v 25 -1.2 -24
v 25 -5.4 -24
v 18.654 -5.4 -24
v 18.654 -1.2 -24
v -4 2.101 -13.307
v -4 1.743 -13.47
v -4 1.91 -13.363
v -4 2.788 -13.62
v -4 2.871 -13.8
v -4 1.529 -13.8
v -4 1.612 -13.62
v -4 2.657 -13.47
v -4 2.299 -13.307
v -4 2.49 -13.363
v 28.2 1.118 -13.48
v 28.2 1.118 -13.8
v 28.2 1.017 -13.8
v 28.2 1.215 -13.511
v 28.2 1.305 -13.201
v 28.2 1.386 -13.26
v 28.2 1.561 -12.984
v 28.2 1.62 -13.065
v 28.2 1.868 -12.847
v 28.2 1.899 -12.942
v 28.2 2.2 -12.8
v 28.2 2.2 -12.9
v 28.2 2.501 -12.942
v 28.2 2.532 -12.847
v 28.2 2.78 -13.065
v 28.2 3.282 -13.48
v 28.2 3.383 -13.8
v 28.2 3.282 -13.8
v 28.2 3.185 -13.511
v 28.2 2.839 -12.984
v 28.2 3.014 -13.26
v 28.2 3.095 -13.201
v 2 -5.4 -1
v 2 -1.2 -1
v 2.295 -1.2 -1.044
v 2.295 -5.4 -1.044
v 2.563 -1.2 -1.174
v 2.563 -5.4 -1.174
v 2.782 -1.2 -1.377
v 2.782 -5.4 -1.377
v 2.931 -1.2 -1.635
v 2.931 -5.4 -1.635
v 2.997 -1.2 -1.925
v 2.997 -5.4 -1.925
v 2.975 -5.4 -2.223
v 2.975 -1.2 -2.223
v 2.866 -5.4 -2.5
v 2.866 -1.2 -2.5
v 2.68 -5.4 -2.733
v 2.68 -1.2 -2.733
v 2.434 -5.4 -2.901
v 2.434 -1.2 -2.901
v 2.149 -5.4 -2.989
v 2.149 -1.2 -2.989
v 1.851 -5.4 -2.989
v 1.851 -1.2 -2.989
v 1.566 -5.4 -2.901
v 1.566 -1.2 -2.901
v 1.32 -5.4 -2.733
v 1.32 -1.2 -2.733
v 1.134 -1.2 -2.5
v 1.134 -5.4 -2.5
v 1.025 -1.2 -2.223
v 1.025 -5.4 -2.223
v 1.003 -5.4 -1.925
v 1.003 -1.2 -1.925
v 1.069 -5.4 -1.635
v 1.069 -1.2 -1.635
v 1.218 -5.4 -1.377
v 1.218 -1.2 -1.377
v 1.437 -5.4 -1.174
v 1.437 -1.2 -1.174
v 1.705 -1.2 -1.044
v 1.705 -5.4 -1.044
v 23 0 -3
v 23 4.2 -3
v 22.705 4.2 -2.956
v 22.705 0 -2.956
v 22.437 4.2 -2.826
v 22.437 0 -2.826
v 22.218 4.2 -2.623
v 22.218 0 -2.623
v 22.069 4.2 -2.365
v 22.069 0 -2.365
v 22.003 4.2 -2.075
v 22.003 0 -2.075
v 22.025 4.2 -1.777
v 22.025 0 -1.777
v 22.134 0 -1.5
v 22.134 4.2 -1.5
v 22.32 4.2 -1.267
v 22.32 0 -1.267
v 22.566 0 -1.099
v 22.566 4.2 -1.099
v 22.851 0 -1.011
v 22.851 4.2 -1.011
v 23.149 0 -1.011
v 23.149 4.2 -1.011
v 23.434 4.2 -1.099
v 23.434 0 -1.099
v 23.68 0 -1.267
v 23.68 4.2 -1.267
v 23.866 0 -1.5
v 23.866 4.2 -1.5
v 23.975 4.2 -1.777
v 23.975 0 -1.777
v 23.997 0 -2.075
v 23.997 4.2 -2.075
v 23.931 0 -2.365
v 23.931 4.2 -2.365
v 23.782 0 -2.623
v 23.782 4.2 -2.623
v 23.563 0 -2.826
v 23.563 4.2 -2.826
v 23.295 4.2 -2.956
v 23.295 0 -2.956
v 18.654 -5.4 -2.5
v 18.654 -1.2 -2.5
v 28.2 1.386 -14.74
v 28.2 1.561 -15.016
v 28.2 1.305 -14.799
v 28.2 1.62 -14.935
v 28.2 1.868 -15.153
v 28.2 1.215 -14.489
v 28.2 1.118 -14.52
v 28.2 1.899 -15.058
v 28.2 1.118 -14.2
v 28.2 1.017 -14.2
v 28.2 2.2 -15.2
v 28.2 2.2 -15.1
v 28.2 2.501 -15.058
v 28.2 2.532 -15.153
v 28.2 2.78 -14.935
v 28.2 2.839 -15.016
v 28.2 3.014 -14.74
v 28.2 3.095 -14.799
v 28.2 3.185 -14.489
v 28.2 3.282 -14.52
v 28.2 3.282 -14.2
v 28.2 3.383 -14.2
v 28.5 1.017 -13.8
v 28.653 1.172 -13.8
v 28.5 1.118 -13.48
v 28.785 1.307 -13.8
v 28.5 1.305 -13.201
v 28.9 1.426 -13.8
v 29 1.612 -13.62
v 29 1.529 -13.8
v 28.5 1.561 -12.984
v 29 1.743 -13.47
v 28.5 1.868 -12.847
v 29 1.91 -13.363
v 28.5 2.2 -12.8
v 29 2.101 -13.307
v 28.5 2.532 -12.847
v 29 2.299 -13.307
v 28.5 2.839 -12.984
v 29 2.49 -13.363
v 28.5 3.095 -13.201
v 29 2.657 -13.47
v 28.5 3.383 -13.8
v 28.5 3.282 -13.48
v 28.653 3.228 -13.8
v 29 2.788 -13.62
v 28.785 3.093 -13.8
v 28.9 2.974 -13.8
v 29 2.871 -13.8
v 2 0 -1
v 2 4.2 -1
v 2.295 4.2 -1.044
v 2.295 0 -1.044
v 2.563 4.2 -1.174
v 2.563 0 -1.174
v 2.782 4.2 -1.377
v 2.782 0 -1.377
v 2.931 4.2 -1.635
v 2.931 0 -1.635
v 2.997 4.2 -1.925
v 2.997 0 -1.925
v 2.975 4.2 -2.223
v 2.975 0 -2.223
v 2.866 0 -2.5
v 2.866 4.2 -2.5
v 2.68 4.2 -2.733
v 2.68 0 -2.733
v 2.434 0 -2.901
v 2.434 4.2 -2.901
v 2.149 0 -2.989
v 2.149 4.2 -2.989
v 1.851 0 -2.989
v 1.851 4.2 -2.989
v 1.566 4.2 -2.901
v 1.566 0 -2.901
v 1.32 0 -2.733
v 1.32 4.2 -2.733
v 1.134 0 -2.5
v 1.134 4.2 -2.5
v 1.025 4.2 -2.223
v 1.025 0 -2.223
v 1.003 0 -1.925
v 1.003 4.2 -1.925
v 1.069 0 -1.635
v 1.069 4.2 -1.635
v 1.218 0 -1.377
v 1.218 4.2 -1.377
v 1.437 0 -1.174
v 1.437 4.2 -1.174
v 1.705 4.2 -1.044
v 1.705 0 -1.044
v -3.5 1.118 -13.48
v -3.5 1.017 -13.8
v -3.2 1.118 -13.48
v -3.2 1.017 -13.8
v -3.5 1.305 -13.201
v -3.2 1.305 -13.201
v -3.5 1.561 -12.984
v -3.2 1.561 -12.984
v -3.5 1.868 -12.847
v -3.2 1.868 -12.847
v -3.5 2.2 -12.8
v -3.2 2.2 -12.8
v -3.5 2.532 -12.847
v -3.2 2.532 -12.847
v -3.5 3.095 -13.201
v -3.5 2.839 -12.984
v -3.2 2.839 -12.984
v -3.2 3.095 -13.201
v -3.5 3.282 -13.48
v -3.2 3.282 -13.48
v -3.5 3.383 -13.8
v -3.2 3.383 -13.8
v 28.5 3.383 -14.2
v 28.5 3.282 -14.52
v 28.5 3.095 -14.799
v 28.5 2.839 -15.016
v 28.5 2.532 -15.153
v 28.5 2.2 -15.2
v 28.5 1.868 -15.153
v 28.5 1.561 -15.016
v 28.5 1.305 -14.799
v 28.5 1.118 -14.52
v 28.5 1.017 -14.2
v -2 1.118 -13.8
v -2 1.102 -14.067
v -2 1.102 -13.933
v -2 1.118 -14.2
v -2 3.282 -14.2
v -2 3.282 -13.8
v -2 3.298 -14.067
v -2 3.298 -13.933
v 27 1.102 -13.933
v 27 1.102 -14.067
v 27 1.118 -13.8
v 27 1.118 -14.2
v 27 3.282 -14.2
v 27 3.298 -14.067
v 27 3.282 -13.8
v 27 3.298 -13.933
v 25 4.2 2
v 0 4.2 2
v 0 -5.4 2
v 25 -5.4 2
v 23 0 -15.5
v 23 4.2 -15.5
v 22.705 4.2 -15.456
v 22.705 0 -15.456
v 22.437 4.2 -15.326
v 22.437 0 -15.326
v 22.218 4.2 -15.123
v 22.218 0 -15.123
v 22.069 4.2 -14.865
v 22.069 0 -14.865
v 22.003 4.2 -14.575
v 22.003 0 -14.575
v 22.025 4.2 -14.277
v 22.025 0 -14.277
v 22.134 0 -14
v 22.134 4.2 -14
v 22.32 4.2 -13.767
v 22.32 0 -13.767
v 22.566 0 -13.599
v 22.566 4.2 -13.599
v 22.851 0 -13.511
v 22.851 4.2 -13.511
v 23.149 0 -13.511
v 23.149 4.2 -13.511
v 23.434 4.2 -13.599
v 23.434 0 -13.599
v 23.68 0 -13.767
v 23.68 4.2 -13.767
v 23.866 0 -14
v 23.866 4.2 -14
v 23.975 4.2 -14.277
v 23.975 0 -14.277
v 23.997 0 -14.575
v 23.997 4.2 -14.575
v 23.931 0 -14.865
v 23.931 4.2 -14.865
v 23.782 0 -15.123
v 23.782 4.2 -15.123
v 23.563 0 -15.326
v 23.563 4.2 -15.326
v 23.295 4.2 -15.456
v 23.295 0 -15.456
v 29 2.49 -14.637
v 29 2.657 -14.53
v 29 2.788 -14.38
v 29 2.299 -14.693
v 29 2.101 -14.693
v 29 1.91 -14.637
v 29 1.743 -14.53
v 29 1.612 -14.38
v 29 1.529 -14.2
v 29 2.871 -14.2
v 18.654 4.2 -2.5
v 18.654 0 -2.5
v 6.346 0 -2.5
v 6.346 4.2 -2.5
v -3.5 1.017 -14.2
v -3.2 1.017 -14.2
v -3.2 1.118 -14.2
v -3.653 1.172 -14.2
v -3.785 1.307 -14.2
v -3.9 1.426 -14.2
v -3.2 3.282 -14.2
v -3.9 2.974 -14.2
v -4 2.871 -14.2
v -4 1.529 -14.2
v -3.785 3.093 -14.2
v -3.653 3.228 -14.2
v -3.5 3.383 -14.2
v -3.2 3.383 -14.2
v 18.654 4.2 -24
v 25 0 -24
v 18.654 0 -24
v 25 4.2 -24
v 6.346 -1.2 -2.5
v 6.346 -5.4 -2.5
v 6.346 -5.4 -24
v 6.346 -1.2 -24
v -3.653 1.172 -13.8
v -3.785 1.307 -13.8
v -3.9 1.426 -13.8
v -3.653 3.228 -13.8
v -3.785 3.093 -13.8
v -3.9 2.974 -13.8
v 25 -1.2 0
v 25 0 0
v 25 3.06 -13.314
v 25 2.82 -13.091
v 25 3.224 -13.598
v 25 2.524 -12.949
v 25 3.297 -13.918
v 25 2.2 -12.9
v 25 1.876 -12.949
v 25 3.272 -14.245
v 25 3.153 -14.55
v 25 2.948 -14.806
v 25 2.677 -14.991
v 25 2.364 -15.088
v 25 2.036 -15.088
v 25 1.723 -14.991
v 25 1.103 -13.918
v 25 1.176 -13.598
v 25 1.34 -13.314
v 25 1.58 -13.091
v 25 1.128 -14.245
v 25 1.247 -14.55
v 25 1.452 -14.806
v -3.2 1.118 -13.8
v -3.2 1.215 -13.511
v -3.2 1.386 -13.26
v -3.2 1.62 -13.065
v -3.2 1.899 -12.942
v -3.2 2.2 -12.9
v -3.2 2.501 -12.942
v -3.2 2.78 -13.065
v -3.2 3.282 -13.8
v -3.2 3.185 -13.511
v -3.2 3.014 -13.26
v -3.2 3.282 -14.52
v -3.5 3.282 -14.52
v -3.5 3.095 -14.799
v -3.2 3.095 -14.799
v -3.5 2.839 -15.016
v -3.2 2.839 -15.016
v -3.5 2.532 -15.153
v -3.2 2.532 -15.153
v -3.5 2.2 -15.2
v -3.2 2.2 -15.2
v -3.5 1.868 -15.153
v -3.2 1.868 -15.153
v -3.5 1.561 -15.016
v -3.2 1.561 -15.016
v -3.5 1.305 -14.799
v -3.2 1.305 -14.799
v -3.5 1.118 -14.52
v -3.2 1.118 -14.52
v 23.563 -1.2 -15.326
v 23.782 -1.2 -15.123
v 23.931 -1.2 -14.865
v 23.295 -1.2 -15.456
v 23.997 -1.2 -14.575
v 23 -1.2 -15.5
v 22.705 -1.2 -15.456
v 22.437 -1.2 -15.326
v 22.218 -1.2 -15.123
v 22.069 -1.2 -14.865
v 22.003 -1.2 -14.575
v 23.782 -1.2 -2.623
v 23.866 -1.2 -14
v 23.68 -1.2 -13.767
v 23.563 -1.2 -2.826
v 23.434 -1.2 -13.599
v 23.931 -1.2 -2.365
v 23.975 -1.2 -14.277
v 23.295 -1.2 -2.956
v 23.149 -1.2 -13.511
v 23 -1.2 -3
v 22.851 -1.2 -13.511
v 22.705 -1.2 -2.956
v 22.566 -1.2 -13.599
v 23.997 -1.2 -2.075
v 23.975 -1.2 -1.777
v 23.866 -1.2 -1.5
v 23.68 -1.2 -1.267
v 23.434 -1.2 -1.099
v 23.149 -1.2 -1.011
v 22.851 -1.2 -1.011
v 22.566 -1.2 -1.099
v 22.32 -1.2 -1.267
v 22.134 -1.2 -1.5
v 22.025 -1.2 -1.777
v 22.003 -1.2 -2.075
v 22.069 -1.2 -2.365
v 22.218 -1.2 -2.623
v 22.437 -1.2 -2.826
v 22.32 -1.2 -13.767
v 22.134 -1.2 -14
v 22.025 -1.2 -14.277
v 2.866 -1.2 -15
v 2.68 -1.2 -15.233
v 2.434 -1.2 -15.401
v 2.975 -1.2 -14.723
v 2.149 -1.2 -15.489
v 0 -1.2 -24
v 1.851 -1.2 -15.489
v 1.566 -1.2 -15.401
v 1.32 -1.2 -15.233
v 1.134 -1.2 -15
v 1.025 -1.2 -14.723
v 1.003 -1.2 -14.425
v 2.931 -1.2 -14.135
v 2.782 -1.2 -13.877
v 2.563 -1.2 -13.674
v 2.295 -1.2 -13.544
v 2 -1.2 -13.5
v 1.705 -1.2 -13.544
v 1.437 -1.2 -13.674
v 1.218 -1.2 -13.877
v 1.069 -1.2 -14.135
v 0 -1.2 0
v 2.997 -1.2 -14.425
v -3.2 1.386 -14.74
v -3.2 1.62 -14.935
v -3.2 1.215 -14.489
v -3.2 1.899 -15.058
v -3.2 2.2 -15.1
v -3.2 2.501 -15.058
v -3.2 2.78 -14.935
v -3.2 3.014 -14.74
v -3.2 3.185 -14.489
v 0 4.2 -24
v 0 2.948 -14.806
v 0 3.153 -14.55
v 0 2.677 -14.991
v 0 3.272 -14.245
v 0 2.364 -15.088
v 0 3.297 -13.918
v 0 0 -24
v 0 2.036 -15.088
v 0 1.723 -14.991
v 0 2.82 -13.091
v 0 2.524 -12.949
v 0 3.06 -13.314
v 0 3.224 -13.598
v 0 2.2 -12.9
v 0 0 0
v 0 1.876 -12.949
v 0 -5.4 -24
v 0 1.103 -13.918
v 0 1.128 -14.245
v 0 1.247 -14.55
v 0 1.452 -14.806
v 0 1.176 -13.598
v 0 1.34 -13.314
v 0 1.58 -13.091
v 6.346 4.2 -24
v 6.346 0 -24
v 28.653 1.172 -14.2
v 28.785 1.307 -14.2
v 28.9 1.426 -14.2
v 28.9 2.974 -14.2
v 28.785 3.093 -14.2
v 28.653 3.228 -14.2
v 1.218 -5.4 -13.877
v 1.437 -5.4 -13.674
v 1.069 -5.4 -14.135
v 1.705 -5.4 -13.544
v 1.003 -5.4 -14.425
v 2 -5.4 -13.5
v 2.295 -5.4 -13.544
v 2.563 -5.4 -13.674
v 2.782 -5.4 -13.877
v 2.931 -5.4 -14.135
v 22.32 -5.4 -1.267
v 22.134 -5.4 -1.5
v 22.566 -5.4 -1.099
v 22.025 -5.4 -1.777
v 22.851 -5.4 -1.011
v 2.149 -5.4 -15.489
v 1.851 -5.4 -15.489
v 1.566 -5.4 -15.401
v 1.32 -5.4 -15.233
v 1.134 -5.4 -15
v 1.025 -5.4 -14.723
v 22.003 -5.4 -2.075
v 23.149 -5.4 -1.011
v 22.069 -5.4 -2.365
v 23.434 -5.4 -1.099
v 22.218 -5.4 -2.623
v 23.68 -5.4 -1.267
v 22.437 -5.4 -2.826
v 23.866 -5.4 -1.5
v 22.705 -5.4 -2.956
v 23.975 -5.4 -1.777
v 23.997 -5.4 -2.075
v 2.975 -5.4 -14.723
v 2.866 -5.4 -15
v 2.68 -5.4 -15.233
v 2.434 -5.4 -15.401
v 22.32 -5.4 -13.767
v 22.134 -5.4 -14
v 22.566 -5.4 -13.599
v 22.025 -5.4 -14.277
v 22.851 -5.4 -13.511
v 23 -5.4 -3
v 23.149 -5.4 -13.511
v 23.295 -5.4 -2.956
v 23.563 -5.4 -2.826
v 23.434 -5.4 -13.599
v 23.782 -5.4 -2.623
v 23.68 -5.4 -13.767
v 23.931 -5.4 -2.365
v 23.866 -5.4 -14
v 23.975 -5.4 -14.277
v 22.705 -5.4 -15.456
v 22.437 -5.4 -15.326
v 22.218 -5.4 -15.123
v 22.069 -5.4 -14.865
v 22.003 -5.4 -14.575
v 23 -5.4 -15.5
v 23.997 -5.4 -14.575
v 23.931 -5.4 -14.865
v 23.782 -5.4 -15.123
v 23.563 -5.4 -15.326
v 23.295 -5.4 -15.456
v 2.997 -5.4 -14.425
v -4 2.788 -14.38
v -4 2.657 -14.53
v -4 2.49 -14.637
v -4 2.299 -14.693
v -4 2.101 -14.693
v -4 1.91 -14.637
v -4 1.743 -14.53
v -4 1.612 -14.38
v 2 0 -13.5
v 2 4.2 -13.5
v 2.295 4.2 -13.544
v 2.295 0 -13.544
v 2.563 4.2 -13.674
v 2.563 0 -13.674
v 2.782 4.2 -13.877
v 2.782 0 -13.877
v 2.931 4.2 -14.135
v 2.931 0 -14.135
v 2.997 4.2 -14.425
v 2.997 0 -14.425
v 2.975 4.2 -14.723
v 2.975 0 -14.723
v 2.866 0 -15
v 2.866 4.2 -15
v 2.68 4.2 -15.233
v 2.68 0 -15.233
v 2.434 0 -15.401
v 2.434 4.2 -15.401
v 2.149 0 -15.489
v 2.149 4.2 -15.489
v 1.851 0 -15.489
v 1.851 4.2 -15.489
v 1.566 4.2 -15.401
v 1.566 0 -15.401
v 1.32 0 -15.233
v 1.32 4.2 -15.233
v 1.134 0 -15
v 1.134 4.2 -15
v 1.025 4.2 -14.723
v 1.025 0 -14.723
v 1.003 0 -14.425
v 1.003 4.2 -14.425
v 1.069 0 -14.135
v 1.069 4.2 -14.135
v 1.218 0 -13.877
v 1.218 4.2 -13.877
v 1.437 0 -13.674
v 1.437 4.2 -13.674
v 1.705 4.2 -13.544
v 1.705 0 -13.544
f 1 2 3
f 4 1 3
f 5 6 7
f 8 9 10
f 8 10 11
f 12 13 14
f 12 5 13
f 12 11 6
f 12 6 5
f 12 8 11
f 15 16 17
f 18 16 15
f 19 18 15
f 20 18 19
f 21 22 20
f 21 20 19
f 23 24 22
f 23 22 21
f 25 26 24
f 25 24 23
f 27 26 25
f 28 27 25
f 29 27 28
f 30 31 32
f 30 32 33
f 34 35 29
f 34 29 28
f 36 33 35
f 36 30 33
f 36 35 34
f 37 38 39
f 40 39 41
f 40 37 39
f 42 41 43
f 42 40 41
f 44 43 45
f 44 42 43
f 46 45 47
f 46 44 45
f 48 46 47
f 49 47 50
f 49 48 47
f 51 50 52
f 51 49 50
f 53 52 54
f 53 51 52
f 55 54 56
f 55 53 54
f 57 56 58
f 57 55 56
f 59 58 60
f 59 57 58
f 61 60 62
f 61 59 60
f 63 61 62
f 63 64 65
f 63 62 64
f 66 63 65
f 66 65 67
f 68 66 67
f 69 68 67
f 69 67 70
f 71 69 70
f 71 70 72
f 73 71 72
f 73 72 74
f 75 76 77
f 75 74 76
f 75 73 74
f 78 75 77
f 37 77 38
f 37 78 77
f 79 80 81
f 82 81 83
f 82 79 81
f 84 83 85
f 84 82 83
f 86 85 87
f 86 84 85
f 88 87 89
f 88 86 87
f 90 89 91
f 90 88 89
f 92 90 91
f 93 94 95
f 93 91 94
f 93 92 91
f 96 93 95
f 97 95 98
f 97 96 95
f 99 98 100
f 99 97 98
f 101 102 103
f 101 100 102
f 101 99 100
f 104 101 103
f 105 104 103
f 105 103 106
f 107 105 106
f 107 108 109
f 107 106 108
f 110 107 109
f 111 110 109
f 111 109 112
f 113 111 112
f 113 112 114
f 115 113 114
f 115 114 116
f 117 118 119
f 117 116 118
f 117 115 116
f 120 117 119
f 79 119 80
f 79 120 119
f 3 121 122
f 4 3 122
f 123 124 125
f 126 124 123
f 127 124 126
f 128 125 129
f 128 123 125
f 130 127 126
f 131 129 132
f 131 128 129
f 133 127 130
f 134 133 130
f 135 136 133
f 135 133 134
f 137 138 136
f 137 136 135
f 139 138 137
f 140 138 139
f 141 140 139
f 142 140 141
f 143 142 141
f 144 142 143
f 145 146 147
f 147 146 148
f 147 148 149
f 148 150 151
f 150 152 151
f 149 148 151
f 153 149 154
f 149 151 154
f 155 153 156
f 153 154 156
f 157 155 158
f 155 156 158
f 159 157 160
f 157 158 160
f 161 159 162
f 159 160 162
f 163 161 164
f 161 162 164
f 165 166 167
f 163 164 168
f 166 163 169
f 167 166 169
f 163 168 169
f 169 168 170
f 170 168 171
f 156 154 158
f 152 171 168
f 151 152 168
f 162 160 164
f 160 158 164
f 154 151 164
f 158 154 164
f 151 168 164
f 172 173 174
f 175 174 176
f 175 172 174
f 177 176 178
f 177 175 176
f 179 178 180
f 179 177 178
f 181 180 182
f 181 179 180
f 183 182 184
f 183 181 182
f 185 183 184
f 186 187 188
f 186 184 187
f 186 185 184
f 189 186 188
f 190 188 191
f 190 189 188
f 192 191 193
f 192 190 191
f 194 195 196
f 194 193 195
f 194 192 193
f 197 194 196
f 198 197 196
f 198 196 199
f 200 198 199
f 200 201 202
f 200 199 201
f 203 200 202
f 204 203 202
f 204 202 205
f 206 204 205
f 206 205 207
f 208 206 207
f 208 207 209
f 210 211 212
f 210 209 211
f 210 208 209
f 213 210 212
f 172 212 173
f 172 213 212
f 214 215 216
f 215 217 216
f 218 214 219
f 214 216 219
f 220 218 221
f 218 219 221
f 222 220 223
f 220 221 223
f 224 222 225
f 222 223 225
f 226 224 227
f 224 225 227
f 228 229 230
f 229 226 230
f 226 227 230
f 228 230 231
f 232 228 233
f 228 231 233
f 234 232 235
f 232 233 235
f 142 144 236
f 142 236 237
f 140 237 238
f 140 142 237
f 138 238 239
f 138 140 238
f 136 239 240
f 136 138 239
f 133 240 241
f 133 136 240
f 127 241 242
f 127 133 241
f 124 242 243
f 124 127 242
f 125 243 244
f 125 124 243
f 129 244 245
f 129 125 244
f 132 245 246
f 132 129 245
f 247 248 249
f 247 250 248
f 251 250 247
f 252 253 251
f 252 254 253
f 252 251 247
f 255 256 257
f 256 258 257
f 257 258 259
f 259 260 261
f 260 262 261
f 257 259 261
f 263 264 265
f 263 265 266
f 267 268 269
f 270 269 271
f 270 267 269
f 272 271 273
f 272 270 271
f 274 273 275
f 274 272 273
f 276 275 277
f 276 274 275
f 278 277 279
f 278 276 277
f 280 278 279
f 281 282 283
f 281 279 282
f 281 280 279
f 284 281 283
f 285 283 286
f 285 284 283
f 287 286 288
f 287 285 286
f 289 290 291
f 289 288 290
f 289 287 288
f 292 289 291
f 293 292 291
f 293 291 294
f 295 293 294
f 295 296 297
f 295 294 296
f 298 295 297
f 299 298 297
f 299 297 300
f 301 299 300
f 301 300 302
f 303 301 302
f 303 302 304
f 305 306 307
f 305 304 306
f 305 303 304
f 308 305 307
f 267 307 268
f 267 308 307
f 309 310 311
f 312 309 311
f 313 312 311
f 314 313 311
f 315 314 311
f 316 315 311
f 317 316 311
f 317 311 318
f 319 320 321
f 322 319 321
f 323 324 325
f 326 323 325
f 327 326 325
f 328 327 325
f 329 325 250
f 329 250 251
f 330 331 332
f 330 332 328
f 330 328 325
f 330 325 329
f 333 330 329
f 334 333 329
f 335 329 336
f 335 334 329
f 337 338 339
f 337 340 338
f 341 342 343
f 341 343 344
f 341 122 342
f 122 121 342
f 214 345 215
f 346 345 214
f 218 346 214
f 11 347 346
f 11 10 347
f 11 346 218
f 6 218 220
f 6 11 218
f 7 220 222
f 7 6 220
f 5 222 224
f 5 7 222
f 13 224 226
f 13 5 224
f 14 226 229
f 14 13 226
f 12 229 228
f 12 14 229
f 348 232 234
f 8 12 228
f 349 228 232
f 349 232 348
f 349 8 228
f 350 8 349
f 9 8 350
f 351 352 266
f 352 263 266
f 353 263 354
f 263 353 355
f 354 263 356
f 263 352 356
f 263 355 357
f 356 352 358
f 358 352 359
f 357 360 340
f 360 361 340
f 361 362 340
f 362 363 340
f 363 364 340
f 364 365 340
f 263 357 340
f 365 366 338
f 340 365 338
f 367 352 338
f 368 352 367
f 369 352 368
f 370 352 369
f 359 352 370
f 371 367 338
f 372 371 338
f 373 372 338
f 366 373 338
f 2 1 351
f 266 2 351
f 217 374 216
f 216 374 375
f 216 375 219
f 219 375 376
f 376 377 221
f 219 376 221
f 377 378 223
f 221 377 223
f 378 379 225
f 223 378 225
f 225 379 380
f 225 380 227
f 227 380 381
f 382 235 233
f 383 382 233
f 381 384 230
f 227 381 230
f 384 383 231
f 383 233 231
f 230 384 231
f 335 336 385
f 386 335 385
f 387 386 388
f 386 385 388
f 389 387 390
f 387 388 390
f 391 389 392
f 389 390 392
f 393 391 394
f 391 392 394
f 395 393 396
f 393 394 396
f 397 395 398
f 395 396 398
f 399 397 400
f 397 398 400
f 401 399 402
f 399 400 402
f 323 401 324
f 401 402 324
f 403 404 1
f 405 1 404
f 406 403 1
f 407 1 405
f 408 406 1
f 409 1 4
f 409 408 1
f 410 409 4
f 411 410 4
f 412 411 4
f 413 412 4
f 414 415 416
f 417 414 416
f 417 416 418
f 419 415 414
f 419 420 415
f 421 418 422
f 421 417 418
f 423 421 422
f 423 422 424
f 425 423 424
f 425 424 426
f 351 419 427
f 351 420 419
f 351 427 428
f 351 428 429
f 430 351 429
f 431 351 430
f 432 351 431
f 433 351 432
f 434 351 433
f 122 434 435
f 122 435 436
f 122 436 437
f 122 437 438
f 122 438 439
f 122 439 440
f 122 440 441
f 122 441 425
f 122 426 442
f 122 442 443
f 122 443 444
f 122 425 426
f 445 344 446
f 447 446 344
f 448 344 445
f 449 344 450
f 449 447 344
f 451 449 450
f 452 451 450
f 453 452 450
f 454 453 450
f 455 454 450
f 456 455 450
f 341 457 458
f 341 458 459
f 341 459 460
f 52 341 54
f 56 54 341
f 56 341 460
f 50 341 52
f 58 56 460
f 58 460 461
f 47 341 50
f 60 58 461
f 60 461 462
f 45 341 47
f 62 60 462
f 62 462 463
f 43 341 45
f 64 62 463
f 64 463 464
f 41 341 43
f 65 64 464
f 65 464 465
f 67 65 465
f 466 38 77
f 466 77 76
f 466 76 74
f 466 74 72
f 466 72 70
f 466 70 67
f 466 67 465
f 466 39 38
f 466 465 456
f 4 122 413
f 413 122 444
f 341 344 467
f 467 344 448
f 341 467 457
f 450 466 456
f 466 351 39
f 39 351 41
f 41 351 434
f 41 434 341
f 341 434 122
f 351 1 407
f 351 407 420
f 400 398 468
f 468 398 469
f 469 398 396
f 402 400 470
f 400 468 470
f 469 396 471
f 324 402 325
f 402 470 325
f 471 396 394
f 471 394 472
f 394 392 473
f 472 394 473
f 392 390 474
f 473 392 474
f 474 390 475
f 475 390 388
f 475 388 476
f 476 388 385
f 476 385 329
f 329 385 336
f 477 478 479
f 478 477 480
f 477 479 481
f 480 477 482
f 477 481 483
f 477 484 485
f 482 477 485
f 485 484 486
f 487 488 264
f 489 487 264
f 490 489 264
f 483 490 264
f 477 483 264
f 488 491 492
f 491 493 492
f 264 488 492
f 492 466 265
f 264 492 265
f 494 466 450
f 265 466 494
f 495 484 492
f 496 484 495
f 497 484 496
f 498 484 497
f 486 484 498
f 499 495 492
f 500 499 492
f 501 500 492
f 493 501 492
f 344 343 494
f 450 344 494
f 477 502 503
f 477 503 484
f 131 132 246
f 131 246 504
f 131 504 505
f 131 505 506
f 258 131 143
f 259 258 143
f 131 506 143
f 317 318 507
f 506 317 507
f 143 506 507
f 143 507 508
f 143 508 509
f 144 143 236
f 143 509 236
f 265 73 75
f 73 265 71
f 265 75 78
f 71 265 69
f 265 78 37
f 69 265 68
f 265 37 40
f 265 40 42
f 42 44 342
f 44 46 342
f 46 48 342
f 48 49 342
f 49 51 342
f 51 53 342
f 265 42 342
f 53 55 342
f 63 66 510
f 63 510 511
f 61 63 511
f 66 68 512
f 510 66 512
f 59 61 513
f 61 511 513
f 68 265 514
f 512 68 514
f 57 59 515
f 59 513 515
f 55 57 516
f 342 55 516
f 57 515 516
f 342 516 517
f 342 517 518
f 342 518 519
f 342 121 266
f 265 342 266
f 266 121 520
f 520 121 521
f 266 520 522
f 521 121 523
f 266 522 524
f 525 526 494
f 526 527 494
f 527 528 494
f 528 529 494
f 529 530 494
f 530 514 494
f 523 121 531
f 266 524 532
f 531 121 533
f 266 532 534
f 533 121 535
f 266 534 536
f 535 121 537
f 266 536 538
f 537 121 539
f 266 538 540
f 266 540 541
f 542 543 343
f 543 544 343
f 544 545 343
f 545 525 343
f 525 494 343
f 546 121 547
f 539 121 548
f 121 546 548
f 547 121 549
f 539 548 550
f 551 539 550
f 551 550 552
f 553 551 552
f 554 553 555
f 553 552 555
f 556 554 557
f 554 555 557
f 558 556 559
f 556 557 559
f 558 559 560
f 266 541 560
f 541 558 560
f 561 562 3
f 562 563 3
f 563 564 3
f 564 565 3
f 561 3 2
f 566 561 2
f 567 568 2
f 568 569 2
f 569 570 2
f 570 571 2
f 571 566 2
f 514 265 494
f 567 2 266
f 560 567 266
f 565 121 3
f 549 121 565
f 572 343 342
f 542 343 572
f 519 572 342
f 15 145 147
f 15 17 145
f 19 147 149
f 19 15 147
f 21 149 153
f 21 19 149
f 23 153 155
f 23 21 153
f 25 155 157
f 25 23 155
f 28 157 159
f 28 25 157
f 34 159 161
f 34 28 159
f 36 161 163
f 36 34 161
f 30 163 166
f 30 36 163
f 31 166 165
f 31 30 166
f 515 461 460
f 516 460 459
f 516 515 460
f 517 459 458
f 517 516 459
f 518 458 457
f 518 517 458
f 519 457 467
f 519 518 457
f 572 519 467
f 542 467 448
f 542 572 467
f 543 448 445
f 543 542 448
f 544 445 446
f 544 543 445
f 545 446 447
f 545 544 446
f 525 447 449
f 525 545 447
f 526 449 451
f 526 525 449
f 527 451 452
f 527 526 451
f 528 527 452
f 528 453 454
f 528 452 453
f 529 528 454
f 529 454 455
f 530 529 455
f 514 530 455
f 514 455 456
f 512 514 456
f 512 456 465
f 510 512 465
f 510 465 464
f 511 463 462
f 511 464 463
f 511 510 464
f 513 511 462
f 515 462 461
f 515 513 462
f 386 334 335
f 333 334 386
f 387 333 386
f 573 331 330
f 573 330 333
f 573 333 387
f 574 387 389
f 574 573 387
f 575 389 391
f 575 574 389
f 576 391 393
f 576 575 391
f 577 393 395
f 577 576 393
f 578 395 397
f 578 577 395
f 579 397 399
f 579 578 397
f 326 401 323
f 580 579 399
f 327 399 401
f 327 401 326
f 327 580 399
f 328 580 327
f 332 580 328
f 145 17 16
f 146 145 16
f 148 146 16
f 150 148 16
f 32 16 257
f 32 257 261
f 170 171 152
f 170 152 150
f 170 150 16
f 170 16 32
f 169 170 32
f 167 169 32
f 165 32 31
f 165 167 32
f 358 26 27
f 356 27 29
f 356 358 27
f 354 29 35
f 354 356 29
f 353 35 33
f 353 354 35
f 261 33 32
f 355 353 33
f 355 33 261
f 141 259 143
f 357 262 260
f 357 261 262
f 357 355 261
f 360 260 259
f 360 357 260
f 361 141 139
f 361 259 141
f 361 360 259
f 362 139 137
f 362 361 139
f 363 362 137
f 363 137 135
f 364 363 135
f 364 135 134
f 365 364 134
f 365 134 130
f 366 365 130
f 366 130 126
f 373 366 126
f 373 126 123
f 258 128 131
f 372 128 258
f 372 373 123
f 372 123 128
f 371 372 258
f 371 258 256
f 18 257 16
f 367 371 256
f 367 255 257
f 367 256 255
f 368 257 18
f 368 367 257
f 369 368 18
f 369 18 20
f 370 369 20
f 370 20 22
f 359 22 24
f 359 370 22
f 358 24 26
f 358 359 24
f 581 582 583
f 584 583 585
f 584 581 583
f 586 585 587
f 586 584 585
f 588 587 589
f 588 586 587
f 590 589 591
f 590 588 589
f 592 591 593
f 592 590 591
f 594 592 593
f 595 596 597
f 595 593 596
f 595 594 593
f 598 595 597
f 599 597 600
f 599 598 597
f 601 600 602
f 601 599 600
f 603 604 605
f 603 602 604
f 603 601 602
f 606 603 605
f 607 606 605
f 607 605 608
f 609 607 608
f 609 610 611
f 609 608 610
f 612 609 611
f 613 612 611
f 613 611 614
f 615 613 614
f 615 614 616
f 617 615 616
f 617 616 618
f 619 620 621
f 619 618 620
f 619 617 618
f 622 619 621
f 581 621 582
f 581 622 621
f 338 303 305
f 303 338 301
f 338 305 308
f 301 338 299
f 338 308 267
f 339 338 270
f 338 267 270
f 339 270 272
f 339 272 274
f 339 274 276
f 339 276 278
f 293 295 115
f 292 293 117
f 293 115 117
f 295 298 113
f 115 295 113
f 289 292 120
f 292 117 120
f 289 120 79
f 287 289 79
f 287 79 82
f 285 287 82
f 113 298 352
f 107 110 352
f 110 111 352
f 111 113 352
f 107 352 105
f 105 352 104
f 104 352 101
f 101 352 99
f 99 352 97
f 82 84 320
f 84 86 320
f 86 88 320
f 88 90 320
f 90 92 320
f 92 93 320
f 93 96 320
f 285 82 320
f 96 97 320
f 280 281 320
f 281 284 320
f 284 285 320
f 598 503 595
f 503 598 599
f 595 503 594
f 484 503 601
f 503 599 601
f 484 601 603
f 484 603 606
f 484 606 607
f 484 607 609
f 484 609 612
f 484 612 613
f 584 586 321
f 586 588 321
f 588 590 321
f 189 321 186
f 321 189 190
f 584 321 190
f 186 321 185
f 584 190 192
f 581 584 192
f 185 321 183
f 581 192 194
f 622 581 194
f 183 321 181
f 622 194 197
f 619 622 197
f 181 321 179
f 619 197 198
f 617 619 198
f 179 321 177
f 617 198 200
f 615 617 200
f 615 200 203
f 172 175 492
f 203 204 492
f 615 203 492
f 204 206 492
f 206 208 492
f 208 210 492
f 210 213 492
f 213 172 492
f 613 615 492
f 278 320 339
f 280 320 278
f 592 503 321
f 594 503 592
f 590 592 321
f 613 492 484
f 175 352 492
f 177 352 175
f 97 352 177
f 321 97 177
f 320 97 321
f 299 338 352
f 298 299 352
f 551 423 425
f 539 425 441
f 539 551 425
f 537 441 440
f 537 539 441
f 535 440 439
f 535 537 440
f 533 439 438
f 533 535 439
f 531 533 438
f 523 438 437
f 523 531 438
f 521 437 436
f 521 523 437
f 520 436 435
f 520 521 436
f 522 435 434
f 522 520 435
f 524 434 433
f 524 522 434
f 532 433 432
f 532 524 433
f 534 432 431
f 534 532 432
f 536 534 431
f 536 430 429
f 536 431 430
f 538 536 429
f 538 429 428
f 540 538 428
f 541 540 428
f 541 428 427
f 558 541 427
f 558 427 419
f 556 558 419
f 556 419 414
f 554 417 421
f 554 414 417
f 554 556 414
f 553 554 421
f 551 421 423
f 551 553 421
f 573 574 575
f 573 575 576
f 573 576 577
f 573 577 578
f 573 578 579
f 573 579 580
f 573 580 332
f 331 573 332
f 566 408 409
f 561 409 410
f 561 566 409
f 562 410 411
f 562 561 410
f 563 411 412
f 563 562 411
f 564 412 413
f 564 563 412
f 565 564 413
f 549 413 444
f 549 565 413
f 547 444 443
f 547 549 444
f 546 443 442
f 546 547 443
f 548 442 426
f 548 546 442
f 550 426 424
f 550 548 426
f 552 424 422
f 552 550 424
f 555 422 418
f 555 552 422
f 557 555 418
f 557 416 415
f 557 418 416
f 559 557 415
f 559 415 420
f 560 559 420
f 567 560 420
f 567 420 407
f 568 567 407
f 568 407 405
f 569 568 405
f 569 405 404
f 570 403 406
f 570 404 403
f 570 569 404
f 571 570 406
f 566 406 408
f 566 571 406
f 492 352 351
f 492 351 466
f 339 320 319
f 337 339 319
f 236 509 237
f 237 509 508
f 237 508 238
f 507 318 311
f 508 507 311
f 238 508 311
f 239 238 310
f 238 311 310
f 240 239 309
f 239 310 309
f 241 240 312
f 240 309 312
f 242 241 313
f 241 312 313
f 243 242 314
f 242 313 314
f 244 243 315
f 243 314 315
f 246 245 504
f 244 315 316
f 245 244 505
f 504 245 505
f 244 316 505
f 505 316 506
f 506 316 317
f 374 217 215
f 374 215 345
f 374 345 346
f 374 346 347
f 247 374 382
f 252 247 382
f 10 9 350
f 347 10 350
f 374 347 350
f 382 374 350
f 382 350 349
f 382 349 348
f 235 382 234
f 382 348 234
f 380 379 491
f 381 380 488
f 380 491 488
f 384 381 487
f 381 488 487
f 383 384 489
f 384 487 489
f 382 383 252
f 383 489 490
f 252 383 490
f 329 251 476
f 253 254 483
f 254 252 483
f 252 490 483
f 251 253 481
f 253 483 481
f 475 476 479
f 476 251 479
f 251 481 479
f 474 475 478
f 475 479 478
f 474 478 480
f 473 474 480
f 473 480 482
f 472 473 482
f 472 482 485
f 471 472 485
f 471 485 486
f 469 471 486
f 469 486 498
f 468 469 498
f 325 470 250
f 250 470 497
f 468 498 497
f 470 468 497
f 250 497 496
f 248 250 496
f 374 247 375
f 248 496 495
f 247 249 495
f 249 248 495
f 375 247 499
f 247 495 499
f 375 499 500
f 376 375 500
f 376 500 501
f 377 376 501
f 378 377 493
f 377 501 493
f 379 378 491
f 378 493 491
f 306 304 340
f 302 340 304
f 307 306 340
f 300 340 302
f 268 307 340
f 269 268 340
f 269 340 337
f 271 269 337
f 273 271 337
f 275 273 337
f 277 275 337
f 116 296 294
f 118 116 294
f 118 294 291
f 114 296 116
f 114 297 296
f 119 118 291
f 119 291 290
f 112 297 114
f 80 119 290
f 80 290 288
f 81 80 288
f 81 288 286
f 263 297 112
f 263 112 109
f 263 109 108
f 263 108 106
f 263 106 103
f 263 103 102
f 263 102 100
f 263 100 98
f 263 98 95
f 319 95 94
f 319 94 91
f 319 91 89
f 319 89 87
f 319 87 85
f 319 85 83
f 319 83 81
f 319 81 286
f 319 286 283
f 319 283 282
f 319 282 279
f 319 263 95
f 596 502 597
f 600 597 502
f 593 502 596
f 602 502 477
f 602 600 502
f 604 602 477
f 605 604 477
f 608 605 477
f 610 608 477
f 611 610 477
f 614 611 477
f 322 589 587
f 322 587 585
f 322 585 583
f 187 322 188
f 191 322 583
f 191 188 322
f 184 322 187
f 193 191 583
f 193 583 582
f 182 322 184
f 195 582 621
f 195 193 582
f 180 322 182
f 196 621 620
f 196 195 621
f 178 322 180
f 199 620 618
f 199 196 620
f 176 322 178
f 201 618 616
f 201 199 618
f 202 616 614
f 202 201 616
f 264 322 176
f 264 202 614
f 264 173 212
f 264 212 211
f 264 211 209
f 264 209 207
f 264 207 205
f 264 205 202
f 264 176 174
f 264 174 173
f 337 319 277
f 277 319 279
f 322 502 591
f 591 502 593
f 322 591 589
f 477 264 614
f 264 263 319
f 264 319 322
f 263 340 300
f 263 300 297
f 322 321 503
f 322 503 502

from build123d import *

# Parameters (mm, degrees)
SKETCH1_R           = 1
BOSS_EXTRUDE1_DEPTH = 4.2
SKETCH2_R           = 1.2
BOSS_EXTRUDE2_DEPTH = 4
SKETCH3_W           = 25
SKETCH3_H           = 4.2
BOSS_EXTRUDE3_DEPTH = 2
SKETCH4_W           = 25
SKETCH4_H           = 2
BOSS_EXTRUDE4_DEPTH = 0.6
BOSS_EXTRUDE5_START = -5.4
SKETCH1_3_R         = 1
BOSS_EXTRUDE5_DEPTH = 5.4
SKETCH4_2_W         = 25
SKETCH4_2_H         = 2
BOSS_EXTRUDE6_DEPTH = 5.4
CUT_EXTRUDE2_REACH  = 35.413
SKETCH5_W           = 25
SKETCH5_H           = 1.2
SKETCH6_W           = 2.096367106
SKETCH6_H           = 4.2
BOSS_EXTRUDE8_DEPTH = 21.5
SKETCH5_2_W         = 25
SKETCH5_2_H         = 1.2
CUT_EXTRUDE4_DEPTH  = 2.5
SKETCH8_R           = 1.2
SKETCH8_R_2         = 1.1
CUT_EXTRUDE5_DEPTH  = 3.2
CHAMFER1_SIZE       = 0.5
SKETCH10_W          = 0.4
SKETCH10_H          = 3.208969491
CUT_EXTRUDE6_DEPTH  = 2


# Read off the part's stored shape, not the designer's step: Mirror1
with BuildPart() as part:
    # Sketch1 → Boss-Extrude1 (new body)
    with BuildSketch(Plane(origin=(0, 0, 0), x_dir=(1, 0, 0), z_dir=(0, 1, 0))):
        Polygon((0, 0), (25, 0), (25, 24), (20.75, 24), (20.75, 2.5), (4.25, 2.5), (4.25, 24), (0, 24), align=None)
        with Locations(Location((2, 14.5, 0), (0, 0, 270))):
            Circle(SKETCH1_R, mode=Mode.SUBTRACT)
        with Locations(Location((2, 2, 0), (0, 0, 270))):
            Circle(SKETCH1_R, mode=Mode.SUBTRACT)
        with Locations(Location((23, 2, 0), (0, 0, 90))):
            Circle(SKETCH1_R, mode=Mode.SUBTRACT)
        with Locations(Location((23, 14.5, 0), (0, 0, 90))):
            Circle(SKETCH1_R, mode=Mode.SUBTRACT)
    extrude(amount=BOSS_EXTRUDE1_DEPTH)

    # Sketch2 → Boss-Extrude2 (add)
    with BuildSketch(Plane.ZY):
        with Locations((-14, 2.2)):
            Circle(SKETCH2_R)
    extrude(amount=BOSS_EXTRUDE2_DEPTH)

    # Sketch3 → Boss-Extrude3 (add)
    with BuildSketch(Plane.XY):
        with Locations((12.5, 2.1)):
            Rectangle(SKETCH3_W, SKETCH3_H)
    extrude(amount=BOSS_EXTRUDE3_DEPTH)

    # Sketch4 → Boss-Extrude4 (add)
    with BuildSketch(Plane.XZ):
        with Locations((12.5, 1)):
            Rectangle(SKETCH4_W, SKETCH4_H)
    extrude(amount=BOSS_EXTRUDE4_DEPTH)

    # Sketch1<3> → Boss-Extrude5 (add)
    with BuildSketch(Plane(origin=(0, 0, 0), x_dir=(1, 0, 0), z_dir=(0, 1, 0)).offset(BOSS_EXTRUDE5_START)):
        Polygon((0, 0), (25, 0), (25, 24), (20.75, 24), (20.75, 2.5), (4.25, 2.5), (4.25, 24), (0, 24), align=None)
        with Locations(Location((2, 14.5, 0), (0, 0, 270))):
            Circle(SKETCH1_3_R, mode=Mode.SUBTRACT)
        with Locations(Location((2, 2, 0), (0, 0, 270))):
            Circle(SKETCH1_3_R, mode=Mode.SUBTRACT)
        with Locations(Location((23, 2, 0), (0, 0, 90))):
            Circle(SKETCH1_3_R, mode=Mode.SUBTRACT)
        with Locations(Location((23, 14.5, 0), (0, 0, 90))):
            Circle(SKETCH1_3_R, mode=Mode.SUBTRACT)
    extrude(amount=BOSS_EXTRUDE5_DEPTH)

    # Sketch4<2> → Boss-Extrude6 (add)
    with BuildSketch(Plane.XZ):
        with Locations((12.5, 1)):
            Rectangle(SKETCH4_2_W, SKETCH4_2_H)
    extrude(amount=BOSS_EXTRUDE6_DEPTH)

    # Cut-Extrude2: up to this face of the body (flat: up to its plane)
    cut_extrude2_end = Plane(part.part.faces().sort_by_distance((22.875, -0.6, -24))[0])
    # Sketch5 → Cut-Extrude2 (cut, up to the picked face)
    with BuildSketch(Plane(origin=(0, 0, -2.5), x_dir=(-1, 0, 0), z_dir=(0, 0, -1)), mode=Mode.PRIVATE) as cut_extrude2_sk1:
        with Locations((-12.5, -0.6)):
            Rectangle(SKETCH5_W, SKETCH5_H)
    cut_extrude2_tool1 = split(extrude(cut_extrude2_sk1.sketch, amount=CUT_EXTRUDE2_REACH, mode=Mode.PRIVATE), bisect_by=cut_extrude2_end, keep=Keep.BOTH, mode=Mode.PRIVATE)
    add(cut_extrude2_tool1.solids().sort_by(Axis((12.5, -0.6, -2.5), (0, 0, -1)))[0], mode=Mode.SUBTRACT)

    # Sketch6 → Boss-Extrude8 (add)
    with BuildSketch(Plane(origin=(0, 0, -2.5), x_dir=(-1, 0, 0), z_dir=(0, 0, -1))):
        with Locations((-19.701816447, 2.1)):
            Rectangle(SKETCH6_W, SKETCH6_H)
        with Locations((-5.298183553, 2.1)):
            Rectangle(SKETCH6_W, SKETCH6_H)
        with Locations((-5.298183553, -3.3)):
            Rectangle(SKETCH6_W, SKETCH6_H)
        with Locations((-19.701816447, -3.3)):
            Rectangle(SKETCH6_W, SKETCH6_H)
    extrude(amount=BOSS_EXTRUDE8_DEPTH)

    # Sketch5<2> → Cut-Extrude4 (cut)
    with BuildSketch(Plane(origin=(0, 0, -2.5), x_dir=(-1, 0, 0), z_dir=(0, 0, -1))):
        with Locations((-12.5, -0.6)):
            Rectangle(SKETCH5_2_W, SKETCH5_2_H)
    extrude(amount=-CUT_EXTRUDE4_DEPTH, mode=Mode.SUBTRACT)

    # Sketch8 → Cut-Extrude5 (cut)
    with BuildSketch(Plane.ZY):
        with Locations((-14, 2.2)):
            Circle(SKETCH8_R)
        with Locations((-14, 2.2)):
            Circle(SKETCH8_R_2, mode=Mode.SUBTRACT)
    extrude(amount=CUT_EXTRUDE5_DEPTH, mode=Mode.SUBTRACT)

    # Chamfer1
    chamfer1_edges = [part.edges().sort_by_distance(p)[0] for p in [
        (-4, 2.2, -15.2),
    ]]
    chamfer(chamfer1_edges, length=CHAMFER1_SIZE)

    # Sketch10 → Cut-Extrude6 (cut)
    with BuildSketch(Plane.ZY.offset(4)):
        with Locations((-14, 2.169354983)):
            Rectangle(SKETCH10_W, SKETCH10_H)
    extrude(amount=-CUT_EXTRUDE6_DEPTH, mode=Mode.SUBTRACT)

    # Mirror1: part across plane


with BuildPart() as part_1:
    add(part.part)
    add(part.part.mirror(Plane.ZY.offset(-12.5)))


solid = part_1.part
